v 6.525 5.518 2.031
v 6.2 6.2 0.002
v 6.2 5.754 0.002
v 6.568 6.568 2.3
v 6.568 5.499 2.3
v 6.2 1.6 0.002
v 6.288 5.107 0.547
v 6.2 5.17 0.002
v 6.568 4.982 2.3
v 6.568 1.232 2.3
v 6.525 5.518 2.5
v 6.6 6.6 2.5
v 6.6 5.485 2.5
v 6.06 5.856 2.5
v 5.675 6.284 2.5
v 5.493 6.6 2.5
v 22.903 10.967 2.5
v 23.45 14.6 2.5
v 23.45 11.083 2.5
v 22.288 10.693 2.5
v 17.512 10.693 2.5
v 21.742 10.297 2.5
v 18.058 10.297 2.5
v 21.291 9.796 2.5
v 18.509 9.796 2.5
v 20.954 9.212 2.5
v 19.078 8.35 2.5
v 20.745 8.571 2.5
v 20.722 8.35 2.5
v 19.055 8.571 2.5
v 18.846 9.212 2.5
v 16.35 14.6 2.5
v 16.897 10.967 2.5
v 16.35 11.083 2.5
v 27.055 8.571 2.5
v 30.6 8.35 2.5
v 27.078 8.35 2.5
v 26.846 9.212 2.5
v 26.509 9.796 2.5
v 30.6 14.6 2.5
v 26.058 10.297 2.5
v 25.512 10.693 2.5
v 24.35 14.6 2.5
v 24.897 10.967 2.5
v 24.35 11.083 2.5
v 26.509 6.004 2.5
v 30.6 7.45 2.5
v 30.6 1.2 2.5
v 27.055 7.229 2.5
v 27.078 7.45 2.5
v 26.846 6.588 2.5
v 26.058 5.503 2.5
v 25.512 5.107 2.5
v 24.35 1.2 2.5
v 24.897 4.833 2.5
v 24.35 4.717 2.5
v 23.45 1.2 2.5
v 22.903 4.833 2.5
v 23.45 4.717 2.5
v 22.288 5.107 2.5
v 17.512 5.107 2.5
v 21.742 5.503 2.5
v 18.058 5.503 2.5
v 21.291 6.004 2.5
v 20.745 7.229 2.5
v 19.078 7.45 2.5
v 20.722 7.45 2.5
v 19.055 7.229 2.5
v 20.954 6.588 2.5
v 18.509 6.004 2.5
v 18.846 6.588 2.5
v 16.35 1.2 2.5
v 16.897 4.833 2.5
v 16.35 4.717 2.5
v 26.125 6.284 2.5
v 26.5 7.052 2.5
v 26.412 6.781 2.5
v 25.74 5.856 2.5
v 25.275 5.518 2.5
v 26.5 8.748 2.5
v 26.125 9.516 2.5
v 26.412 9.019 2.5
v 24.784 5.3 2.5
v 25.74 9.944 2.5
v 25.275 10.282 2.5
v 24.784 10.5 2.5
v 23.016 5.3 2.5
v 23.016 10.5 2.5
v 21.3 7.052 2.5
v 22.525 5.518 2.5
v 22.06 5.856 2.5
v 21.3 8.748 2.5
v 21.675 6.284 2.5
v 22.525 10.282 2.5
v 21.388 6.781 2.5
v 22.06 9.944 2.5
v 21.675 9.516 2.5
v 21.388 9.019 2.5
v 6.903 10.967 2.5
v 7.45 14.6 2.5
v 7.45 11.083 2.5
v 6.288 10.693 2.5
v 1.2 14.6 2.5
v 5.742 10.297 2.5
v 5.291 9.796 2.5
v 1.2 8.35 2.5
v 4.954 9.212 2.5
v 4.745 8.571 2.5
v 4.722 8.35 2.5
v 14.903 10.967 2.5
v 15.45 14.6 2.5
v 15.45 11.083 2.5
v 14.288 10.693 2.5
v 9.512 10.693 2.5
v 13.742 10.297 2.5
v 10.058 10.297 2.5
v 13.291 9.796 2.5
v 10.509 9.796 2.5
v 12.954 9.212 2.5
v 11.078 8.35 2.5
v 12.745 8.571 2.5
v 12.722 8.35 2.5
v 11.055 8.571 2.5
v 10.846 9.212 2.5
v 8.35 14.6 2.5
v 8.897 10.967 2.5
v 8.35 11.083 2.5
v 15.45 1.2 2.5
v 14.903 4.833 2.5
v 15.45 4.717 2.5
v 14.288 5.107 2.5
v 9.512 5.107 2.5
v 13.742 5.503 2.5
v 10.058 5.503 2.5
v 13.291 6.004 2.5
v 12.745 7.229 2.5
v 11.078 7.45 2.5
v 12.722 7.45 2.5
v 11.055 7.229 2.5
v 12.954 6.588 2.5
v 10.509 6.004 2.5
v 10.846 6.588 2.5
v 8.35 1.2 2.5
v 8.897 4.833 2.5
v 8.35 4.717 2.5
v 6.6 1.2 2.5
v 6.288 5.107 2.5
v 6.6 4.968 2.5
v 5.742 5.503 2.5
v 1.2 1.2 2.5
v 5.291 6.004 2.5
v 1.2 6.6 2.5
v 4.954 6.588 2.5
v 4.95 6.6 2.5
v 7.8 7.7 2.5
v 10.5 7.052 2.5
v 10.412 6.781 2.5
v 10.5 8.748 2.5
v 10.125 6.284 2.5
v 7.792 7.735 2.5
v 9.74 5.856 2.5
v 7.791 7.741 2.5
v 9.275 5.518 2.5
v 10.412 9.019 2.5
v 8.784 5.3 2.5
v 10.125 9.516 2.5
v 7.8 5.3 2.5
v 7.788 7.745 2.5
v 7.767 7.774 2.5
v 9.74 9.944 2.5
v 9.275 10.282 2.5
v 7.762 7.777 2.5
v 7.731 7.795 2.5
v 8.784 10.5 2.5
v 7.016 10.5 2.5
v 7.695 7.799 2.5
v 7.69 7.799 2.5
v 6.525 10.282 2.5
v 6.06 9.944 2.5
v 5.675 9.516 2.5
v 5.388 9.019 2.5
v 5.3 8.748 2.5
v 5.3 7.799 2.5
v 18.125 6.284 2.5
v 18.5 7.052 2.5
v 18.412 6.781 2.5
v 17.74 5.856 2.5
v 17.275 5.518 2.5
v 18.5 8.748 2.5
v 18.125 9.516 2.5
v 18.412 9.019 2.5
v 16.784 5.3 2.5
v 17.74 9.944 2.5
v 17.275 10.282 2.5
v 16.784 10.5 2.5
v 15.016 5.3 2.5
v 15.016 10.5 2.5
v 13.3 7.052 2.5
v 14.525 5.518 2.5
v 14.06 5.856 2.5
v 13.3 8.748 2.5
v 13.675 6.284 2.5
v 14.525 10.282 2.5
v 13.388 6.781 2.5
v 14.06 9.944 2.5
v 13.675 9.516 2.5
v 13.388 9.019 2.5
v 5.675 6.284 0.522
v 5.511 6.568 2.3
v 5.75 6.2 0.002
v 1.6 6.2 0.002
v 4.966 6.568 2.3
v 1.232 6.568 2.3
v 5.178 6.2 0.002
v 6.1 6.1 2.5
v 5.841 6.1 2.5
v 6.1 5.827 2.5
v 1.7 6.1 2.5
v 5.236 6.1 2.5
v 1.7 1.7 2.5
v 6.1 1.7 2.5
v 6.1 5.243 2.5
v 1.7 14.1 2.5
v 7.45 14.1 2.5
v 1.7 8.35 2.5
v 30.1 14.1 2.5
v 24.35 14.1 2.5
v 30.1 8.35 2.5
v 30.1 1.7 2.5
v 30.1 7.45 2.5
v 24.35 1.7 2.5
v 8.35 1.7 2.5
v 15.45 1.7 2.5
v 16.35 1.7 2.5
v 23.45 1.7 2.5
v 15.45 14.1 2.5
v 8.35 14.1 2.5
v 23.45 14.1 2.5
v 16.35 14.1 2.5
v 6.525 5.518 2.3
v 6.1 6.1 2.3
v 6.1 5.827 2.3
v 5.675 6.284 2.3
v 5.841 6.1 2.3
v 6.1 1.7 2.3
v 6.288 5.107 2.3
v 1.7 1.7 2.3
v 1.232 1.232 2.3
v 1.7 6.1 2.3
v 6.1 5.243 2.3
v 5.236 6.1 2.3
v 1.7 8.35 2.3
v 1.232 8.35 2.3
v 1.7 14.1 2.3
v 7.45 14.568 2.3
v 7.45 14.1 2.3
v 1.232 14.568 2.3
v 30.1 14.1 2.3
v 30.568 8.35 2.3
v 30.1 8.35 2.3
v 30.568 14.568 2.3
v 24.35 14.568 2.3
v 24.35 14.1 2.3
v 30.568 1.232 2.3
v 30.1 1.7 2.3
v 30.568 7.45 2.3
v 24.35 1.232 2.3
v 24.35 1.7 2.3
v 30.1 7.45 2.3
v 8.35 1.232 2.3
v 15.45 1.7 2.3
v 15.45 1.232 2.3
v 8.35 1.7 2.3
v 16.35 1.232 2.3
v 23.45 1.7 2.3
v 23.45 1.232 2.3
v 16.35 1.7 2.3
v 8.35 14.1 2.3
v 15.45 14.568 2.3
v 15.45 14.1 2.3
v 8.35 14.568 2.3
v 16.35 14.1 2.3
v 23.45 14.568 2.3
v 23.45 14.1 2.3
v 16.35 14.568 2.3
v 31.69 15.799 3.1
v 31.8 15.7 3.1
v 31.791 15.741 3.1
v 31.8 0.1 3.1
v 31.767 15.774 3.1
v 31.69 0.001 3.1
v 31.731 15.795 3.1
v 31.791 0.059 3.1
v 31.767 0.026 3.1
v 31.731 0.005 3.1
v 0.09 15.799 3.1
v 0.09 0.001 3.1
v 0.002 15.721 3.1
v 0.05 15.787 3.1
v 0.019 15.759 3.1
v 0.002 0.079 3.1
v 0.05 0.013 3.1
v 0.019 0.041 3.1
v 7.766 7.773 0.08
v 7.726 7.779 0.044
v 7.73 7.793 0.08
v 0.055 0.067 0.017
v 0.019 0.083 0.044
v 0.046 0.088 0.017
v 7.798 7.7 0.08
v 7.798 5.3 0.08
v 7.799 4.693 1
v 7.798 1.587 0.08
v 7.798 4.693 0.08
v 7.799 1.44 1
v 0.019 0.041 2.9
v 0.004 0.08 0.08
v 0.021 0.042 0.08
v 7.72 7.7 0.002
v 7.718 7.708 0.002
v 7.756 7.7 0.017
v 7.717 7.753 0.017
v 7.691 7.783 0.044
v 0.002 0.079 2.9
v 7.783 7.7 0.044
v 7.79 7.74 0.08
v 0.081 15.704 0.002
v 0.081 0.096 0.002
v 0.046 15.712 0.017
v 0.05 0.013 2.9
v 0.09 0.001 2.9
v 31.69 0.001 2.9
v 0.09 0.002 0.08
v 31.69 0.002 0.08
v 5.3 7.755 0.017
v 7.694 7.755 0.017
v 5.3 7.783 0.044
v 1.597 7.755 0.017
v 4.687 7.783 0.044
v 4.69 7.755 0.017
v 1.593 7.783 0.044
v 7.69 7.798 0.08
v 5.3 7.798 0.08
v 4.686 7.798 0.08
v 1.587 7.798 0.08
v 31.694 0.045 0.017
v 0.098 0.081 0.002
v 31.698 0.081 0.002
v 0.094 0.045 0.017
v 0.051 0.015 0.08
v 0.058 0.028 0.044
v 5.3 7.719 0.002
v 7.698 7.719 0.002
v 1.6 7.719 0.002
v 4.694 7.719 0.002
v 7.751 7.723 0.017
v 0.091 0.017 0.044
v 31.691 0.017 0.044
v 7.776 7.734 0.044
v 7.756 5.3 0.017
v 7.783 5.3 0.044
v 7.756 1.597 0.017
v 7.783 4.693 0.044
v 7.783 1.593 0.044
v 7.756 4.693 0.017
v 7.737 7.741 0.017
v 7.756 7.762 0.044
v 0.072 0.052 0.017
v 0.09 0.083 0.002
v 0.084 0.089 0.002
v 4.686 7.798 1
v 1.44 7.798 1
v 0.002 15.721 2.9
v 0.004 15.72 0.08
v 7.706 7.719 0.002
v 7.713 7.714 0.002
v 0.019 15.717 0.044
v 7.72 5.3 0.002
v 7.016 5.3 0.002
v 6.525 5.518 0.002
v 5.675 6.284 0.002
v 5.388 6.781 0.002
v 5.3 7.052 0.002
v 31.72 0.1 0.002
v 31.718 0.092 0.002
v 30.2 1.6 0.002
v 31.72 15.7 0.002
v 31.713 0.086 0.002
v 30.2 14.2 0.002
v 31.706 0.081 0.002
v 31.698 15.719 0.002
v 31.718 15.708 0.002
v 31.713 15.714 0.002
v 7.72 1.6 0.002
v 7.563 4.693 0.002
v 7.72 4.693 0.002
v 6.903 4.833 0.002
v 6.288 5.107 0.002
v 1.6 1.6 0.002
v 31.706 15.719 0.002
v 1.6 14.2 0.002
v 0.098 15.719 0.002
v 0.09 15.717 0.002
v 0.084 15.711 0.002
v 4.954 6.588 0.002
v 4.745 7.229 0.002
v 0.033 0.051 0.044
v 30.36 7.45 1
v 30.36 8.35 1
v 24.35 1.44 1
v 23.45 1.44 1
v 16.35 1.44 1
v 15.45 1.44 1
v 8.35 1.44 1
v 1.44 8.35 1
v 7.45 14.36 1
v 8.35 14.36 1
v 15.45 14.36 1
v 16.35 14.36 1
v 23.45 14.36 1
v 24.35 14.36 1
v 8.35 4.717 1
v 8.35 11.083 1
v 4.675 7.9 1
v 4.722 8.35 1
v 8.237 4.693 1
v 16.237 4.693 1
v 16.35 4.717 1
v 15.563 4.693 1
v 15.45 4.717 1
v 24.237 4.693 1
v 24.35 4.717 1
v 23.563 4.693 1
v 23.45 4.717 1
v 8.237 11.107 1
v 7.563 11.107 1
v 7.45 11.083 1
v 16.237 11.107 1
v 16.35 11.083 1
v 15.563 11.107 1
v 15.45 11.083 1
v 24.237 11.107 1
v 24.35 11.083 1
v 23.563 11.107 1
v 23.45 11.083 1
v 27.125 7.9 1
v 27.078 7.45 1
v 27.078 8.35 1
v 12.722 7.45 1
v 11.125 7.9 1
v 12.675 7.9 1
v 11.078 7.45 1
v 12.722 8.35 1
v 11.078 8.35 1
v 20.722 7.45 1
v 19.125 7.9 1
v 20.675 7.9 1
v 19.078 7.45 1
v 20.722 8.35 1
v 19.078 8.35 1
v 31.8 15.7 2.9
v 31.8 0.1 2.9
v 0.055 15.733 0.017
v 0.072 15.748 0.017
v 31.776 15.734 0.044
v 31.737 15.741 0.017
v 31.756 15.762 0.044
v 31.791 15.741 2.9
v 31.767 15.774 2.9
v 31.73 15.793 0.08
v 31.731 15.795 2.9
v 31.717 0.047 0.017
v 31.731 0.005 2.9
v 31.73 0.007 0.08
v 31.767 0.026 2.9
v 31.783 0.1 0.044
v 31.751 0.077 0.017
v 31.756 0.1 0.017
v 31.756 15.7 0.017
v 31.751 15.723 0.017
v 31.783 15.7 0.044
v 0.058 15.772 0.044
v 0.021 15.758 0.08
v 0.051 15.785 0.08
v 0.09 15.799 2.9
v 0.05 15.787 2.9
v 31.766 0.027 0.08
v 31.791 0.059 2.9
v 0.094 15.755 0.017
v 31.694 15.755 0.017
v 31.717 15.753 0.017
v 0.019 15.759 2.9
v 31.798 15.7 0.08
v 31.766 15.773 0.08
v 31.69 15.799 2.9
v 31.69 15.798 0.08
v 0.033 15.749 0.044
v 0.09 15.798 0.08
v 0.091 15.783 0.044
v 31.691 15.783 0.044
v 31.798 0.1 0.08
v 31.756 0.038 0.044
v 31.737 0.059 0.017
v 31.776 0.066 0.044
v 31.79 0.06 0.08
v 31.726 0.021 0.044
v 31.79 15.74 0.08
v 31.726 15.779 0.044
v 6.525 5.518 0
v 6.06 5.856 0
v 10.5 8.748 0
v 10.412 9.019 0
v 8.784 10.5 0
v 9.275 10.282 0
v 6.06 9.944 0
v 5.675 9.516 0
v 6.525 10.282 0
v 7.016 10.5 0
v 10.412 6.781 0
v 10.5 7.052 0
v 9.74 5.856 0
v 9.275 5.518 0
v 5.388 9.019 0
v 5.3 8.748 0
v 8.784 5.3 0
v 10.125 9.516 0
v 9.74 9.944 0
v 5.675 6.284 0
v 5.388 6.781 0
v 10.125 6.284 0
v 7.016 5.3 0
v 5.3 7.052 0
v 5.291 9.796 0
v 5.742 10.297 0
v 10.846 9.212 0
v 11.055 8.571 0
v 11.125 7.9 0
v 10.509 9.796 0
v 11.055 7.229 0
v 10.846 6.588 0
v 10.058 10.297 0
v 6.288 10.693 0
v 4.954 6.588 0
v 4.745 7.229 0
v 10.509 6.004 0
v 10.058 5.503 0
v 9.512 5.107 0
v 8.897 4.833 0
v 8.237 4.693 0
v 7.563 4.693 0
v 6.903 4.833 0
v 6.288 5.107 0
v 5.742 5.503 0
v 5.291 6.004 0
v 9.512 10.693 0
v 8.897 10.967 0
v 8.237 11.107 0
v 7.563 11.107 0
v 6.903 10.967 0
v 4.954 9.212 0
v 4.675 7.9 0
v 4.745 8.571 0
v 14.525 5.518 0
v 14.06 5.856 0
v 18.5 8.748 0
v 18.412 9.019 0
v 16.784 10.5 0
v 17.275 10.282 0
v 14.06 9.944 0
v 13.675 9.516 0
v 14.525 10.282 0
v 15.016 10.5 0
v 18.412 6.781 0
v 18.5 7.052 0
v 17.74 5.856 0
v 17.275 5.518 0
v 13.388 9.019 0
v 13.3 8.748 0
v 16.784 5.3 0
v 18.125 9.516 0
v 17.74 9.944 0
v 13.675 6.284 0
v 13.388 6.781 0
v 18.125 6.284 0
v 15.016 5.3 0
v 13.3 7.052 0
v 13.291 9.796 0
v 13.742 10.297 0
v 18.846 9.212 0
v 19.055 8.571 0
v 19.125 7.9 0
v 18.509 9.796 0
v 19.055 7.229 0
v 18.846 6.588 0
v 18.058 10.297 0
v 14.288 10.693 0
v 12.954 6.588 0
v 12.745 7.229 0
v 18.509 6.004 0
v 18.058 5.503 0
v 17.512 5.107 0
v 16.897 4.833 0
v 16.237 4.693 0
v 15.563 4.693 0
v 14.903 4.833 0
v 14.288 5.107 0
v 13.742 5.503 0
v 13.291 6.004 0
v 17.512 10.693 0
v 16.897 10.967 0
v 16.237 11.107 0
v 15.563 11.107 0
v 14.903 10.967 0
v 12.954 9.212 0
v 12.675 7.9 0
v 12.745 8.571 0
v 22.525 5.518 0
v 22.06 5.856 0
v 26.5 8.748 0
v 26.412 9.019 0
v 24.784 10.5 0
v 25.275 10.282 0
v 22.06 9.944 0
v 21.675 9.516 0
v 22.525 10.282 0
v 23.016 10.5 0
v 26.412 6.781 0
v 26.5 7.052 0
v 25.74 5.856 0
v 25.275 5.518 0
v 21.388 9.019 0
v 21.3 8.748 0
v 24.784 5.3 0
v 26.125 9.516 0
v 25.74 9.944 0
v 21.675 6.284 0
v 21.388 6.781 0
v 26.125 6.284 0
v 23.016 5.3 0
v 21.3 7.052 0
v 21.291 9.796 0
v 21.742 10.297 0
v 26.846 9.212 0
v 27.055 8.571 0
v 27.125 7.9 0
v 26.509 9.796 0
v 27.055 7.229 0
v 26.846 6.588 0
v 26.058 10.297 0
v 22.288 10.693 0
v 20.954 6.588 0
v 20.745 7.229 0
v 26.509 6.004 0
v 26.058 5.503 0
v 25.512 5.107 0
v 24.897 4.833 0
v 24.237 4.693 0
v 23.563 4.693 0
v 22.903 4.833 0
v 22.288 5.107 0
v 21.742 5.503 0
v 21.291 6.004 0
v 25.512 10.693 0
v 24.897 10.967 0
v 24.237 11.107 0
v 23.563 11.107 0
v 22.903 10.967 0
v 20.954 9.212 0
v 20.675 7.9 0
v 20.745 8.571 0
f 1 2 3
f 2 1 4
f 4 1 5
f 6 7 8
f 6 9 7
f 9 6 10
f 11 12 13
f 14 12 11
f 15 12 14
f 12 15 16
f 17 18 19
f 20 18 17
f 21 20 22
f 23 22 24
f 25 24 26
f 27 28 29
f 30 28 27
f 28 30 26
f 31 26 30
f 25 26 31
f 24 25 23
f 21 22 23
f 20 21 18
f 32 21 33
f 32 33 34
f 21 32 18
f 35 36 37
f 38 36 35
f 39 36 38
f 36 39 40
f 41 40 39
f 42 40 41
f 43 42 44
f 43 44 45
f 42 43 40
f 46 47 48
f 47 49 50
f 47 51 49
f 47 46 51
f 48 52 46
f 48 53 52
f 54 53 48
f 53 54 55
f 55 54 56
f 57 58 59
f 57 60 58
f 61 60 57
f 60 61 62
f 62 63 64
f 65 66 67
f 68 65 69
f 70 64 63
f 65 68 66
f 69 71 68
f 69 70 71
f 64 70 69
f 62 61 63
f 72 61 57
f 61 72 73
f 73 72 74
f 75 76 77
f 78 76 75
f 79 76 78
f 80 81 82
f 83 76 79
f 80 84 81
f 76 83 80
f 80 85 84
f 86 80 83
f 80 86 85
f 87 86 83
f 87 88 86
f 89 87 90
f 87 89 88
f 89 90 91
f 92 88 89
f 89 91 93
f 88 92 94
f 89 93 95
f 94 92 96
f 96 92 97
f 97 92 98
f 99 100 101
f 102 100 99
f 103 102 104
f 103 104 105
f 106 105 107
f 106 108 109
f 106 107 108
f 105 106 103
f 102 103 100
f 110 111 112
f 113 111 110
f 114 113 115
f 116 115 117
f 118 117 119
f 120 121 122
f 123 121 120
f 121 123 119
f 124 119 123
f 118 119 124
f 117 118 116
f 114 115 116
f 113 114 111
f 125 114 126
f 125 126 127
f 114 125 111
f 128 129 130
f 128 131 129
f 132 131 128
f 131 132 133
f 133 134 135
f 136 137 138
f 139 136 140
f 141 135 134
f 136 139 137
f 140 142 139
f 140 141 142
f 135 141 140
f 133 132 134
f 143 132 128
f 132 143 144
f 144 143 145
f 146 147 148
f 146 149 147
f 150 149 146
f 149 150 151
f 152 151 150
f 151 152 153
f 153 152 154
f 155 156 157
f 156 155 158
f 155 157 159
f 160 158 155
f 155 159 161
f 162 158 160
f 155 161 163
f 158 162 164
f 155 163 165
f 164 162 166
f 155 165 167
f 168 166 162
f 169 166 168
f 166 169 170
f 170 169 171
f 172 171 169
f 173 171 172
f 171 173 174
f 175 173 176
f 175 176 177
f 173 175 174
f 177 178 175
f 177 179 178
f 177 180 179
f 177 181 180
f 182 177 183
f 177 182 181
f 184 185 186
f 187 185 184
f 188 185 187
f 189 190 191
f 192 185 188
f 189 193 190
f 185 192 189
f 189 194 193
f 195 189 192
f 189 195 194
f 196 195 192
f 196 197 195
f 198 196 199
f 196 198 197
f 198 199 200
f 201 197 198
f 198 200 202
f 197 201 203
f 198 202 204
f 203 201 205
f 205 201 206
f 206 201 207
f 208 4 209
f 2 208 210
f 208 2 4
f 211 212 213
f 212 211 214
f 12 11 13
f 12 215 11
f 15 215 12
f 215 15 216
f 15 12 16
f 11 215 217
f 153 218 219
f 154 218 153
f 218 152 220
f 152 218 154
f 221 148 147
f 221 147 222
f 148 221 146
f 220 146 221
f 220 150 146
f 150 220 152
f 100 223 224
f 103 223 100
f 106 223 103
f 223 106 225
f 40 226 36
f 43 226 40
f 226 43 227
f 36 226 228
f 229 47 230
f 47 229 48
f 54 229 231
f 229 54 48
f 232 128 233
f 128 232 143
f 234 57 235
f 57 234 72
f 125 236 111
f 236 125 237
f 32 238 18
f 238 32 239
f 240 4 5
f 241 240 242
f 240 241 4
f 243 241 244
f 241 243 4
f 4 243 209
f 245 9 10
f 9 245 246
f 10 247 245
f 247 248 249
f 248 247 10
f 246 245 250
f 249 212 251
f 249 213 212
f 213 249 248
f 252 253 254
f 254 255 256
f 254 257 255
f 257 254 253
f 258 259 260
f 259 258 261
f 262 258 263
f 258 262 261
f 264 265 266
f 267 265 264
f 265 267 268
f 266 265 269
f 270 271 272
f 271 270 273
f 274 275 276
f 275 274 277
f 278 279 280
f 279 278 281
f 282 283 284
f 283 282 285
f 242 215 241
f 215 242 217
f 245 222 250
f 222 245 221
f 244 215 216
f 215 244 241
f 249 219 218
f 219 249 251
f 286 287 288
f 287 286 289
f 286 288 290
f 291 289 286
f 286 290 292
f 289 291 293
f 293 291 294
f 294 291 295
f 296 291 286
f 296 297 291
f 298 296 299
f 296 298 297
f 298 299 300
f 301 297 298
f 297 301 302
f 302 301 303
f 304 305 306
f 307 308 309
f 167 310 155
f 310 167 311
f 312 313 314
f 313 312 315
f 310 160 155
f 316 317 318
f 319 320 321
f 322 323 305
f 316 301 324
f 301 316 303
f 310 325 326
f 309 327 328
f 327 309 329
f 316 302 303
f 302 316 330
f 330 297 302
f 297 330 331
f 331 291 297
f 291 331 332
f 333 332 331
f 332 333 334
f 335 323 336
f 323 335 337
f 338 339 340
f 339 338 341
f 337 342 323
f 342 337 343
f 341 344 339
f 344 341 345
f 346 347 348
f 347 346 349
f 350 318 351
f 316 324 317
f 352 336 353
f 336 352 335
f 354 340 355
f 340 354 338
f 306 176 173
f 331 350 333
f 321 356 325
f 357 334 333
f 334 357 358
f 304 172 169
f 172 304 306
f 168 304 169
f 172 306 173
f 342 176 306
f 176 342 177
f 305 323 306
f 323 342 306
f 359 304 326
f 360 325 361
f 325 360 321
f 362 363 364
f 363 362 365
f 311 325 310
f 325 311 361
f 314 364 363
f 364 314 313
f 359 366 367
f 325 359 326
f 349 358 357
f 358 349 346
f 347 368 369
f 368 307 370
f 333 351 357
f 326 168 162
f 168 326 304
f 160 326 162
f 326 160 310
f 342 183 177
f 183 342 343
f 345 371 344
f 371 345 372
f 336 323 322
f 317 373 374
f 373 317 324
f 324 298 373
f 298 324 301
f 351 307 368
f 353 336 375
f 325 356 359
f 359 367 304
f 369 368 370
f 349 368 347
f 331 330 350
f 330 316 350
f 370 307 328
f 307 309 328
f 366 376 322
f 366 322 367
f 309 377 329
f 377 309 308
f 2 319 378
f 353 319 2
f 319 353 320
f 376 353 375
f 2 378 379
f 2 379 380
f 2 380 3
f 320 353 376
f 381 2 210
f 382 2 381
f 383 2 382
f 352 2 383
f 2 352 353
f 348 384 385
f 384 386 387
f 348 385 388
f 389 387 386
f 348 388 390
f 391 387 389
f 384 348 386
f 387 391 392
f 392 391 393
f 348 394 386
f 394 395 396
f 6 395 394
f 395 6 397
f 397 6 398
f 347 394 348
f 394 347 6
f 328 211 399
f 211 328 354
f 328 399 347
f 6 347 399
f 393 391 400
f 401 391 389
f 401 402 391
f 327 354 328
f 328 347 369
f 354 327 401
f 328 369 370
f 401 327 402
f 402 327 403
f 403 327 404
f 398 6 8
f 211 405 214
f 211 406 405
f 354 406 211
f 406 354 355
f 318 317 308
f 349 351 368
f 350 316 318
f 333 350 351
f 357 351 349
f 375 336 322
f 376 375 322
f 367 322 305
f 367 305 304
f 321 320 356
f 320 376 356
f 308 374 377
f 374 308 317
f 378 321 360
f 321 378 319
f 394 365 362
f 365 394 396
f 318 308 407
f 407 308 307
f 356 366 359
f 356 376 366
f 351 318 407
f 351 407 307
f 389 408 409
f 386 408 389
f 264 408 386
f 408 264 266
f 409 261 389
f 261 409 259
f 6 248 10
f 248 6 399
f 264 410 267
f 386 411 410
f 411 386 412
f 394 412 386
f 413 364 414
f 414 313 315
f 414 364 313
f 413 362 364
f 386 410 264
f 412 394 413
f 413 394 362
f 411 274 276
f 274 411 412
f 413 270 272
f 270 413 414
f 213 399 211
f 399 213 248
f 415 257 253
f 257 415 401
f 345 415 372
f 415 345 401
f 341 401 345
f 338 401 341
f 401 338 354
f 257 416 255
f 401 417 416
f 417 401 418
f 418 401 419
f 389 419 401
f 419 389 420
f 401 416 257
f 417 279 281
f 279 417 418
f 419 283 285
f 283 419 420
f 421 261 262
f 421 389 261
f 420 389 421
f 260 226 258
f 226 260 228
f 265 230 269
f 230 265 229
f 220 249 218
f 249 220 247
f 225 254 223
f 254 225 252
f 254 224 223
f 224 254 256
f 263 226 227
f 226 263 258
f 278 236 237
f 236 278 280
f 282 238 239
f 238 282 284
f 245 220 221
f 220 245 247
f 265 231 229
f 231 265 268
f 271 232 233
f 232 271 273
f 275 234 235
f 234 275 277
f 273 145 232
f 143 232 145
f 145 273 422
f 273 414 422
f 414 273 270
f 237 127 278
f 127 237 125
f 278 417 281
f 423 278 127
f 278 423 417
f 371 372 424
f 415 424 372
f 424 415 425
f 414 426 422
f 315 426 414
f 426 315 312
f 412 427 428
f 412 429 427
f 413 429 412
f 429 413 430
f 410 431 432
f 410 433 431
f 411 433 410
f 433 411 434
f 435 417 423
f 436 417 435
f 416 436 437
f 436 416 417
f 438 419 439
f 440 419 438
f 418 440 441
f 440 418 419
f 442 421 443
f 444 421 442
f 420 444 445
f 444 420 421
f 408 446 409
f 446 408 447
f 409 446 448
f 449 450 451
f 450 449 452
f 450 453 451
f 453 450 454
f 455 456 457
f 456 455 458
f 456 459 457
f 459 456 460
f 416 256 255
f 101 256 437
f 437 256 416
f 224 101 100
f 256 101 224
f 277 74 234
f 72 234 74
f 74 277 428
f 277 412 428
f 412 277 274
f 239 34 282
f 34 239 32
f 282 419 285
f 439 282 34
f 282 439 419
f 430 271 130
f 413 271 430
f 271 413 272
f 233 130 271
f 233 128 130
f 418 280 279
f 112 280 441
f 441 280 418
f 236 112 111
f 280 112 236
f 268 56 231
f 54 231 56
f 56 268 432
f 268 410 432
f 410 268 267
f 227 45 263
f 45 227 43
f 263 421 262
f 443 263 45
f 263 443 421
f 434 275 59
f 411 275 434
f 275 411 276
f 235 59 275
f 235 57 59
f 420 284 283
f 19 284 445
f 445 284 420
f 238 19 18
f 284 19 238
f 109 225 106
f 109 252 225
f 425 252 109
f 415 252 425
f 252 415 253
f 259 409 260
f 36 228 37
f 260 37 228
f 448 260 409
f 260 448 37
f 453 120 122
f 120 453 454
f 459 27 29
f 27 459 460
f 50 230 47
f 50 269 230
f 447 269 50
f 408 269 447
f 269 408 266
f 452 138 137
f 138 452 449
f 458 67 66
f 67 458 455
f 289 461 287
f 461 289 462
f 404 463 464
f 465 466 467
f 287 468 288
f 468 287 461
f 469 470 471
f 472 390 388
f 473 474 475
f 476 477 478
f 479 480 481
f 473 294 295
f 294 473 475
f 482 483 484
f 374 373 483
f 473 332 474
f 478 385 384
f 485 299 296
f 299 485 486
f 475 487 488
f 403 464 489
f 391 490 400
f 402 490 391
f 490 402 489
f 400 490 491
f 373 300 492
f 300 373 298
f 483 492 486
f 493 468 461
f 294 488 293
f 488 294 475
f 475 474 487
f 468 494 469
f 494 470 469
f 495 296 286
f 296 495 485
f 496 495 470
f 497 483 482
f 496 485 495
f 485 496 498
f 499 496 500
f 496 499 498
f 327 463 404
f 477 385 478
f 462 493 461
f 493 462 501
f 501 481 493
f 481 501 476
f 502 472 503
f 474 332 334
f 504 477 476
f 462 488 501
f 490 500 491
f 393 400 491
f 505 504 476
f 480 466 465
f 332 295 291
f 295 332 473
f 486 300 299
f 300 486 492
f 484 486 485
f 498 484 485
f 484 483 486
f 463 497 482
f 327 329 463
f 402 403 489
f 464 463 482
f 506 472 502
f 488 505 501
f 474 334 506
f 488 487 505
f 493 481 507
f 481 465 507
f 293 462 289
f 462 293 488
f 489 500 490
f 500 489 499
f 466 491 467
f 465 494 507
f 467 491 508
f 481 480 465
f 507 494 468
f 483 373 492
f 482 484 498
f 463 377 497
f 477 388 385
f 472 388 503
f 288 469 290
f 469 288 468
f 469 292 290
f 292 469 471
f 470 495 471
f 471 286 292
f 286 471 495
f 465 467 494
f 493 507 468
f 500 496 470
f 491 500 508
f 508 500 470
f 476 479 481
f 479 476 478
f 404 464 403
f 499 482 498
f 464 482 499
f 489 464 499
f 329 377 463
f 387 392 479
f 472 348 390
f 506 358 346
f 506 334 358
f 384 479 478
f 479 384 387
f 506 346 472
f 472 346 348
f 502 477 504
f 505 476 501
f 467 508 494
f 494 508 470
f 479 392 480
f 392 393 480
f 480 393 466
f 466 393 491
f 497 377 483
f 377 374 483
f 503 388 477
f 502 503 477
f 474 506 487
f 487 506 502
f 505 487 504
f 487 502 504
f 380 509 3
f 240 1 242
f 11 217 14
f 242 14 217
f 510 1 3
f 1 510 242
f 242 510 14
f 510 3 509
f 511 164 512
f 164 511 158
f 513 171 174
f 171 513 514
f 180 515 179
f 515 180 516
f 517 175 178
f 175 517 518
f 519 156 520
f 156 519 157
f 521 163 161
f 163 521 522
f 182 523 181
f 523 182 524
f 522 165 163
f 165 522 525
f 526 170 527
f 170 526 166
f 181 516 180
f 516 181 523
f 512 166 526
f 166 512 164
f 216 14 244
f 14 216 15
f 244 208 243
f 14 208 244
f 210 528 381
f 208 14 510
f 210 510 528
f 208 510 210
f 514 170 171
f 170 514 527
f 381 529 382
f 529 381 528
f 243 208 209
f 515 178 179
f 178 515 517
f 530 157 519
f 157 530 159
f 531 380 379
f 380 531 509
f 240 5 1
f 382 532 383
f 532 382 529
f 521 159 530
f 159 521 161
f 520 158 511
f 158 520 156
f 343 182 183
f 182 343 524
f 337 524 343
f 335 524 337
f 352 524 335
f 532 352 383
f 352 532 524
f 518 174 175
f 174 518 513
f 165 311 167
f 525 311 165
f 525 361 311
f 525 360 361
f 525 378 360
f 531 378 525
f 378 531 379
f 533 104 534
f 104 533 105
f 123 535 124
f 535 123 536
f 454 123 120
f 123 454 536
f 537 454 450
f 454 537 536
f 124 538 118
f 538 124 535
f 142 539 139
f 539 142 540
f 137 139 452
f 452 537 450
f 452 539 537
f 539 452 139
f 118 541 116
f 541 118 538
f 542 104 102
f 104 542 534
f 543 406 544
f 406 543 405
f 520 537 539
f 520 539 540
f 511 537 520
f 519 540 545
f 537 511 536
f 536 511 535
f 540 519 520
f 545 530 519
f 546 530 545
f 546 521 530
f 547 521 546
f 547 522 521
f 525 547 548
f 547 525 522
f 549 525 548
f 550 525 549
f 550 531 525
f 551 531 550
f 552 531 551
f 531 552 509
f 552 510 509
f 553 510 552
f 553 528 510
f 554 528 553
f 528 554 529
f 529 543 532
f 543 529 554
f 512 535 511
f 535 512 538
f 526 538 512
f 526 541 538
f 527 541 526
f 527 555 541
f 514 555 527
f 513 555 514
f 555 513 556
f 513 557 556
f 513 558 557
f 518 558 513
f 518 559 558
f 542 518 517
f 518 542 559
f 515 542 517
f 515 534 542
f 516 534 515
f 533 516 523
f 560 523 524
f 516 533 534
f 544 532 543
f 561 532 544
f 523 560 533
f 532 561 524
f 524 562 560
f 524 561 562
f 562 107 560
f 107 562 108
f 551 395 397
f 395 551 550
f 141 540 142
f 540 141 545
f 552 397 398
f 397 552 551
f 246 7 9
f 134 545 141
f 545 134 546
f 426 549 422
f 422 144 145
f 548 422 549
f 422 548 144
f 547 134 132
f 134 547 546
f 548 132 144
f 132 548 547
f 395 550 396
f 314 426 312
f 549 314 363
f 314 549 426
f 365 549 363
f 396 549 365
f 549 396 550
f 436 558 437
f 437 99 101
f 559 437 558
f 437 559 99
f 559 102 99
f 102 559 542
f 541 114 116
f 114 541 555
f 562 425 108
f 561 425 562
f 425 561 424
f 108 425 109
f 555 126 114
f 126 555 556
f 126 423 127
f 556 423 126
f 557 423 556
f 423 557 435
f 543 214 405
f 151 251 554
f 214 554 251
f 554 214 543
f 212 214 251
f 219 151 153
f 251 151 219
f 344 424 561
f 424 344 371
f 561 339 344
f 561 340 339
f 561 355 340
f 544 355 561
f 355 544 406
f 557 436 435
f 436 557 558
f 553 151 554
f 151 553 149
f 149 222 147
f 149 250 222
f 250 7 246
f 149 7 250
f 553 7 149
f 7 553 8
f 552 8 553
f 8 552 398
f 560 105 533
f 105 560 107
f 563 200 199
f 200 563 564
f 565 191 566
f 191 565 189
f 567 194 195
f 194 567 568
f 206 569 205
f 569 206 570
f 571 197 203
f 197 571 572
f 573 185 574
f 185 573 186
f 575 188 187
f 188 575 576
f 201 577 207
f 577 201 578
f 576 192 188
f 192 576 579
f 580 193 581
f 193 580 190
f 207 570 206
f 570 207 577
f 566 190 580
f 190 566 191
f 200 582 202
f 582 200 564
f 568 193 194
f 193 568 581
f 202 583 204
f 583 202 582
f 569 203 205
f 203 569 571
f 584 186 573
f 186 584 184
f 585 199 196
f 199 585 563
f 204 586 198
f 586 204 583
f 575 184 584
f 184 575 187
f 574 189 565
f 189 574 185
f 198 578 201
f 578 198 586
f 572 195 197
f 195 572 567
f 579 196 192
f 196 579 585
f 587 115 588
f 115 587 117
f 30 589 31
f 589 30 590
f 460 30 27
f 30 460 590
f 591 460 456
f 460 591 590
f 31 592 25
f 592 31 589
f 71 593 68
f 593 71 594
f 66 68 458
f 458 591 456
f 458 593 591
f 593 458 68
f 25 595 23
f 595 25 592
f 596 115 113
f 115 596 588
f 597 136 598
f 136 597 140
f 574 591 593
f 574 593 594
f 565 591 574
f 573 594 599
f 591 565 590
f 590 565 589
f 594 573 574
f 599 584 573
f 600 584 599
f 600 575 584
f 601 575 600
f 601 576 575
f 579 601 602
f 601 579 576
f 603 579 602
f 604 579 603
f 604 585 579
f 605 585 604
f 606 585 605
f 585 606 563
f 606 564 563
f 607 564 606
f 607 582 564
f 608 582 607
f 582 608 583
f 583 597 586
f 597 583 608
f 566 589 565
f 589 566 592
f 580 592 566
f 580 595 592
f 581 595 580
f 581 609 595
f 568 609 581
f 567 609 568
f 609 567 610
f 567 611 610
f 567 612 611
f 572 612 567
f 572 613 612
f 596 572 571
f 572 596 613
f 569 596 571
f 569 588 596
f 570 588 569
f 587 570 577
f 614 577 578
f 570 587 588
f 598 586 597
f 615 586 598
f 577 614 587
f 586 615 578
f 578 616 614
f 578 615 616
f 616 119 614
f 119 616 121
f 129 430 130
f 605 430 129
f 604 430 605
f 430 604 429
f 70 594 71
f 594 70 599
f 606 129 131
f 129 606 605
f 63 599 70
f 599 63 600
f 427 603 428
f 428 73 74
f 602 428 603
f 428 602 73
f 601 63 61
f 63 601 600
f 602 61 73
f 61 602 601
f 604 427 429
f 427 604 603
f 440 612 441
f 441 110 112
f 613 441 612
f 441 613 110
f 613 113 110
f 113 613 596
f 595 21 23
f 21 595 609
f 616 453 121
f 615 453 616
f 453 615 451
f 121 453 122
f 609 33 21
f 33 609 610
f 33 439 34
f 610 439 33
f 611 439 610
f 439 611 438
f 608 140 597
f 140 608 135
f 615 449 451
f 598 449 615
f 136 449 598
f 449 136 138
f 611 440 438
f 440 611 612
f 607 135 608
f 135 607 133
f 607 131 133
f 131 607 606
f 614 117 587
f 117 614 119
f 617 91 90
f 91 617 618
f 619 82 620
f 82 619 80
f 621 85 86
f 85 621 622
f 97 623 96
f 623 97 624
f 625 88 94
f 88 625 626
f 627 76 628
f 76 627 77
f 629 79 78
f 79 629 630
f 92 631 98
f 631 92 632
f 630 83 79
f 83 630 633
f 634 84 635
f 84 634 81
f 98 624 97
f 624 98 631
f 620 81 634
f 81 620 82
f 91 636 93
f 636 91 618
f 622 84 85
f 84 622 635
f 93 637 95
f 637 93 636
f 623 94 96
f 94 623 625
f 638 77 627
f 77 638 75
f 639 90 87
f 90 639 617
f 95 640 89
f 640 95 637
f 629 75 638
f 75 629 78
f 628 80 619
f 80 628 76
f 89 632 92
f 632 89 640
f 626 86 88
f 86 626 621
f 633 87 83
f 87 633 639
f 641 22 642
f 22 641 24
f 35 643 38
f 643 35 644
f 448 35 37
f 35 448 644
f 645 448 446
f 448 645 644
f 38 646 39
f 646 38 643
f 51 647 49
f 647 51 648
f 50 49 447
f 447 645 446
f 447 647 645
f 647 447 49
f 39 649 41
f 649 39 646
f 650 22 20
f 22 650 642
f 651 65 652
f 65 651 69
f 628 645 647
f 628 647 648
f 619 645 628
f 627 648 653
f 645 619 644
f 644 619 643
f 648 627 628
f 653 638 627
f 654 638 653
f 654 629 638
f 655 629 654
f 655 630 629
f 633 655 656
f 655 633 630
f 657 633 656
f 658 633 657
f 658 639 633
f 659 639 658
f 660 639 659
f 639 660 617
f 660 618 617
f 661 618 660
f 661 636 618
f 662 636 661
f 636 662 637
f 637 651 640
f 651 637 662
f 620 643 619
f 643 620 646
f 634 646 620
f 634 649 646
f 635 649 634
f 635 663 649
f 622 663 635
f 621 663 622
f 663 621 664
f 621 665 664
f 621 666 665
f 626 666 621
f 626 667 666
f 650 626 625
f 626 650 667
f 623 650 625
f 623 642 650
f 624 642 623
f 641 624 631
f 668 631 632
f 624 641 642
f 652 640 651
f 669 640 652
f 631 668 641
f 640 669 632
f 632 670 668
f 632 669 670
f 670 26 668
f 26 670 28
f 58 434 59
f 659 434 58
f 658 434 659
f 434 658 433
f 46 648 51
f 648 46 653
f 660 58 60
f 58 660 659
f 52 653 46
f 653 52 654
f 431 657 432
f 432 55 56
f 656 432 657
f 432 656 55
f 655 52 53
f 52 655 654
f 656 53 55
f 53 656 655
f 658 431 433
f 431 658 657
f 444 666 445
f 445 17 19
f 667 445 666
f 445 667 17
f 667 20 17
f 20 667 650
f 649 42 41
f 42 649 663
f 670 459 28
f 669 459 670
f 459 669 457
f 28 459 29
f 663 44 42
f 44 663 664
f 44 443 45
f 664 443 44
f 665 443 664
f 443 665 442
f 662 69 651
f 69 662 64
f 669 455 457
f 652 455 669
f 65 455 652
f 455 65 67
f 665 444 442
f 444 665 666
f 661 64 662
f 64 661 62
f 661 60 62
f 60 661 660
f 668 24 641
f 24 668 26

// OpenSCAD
// file: ../lib/brick-hollow.scad
/**
* Machine Blocks
* https://machinemania.net/blocks 
*
* Brick Hollow
* Copyright (c) 2022 Jan Philipp Knoeller <pk@pksoftware.de>
*
* Published under license:
* Creative Commons Attribution-NonCommercial-ShareAlike 4.0 International 
* https://creativecommons.org/licenses/by-nc-sa/4.0/
*
*/
echo(version=version());

module brickHollow(height=9.3, fade=2.5, minSize=[4.6,4.6], maxSize=[5.2, 5.2], center = false){
    echo(height, minSize, maxSize, fade);
    sizeX = max(minSize[0],maxSize[0]); 
   sizeY = max(minSize[1],maxSize[1]); 
    
    posX = center ? 0 : 0.5*sizeX; 
   posY = center ? 0 : 0.5*sizeY;   
   posZ = center ? -0.5 * (height-fade) : 0.5*fade;
    
    cutHelper = 0.2;
    overlapSpace=0.1;
    
    translate([posX, posY, posZ]){
        union(){
            polyhedron(points=[
                [-0.5*minSize[0],-0.5*minSize[1],-0.5*fade],
                [0.5*minSize[0],-0.5*minSize[1],-0.5*fade],
                [0.5*minSize[0],0.5*minSize[1],-0.5*fade],
                [-0.5*minSize[0],0.5*minSize[1],-0.5*fade],
                [-0.5*maxSize[0],-0.5*maxSize[1],0.5*fade],
                [0.5*maxSize[0],-0.5*maxSize[1],0.5*fade],
                [0.5*maxSize[0],0.5*maxSize[1],0.5*fade],
                [-0.5*maxSize[0],0.5*maxSize[1],0.5*fade]
            ], faces=[[0,1,2,3],[1,0,4,5],[2,1,5,6],[3,2,6,7],[0,3,7,4],[7,6,5,4]]);
            
            if(height > fade){
                translate([0,0,0.5*height - overlapSpace]){
                    cube([maxSize[0], maxSize[1], height - fade + overlapSpace], center=true);
                }
            }
            
            translate([0,0,-0.5*(fade + cutHelper) + overlapSpace]){
                cube([minSize[0], minSize[1], cutHelper + overlapSpace], center=true);
            }
        }
    }
}

//brickHollow(height=9.3, maxSize=[5.2,5.2], minSize=[4.6,4.6], center=true);
// file: ../lib/roundedcube_simple.scad
/**
* Machine Blocks
* https://machinemania.net/blocks 
*
* Module for simple rounded cubes
* Copyright (c) 2022 Jan Philipp Knoeller <pk@pksoftware.de>
*
* Published under license:
* Creative Commons Attribution-NonCommercial-ShareAlike 4.0 International 
* https://creativecommons.org/licenses/by-nc-sa/4.0/
*
*/
module roundedcube_simple(size = [1, 1, 1], center = false, radius = 0.5, resolution = 20) {
	// If single value, convert to [x, y, z] vector
	size = (size[0] == undef) ? [size, size, size] : size;

	translate = (center == false) ?
		[radius, radius, radius] :
		[
			radius - (size[0] / 2),
			radius - (size[1] / 2),
			radius - (size[2] / 2)
	];

	translate(v = translate)
	minkowski() {
		cube(size = [
			size[0] - (radius * 2),
			size[1] - (radius * 2),
			size[2] - (radius * 2)
		]);
		sphere(r = radius, $fn = resolution);
	}
}
// file: ../lib/roundedcube.scad
// More information: https://danielupshaw.com/openscad-rounded-corners/

// Set to 0.01 for higher definition curves (renders slower)
$fs = 0.15;

module roundedcube(size = [1, 1, 1], center = false, radius = 0.5, apply_to = "all", resolution = 20) {
	// If single value, convert to [x, y, z] vector
	size = (size[0] == undef) ? [size, size, size] : size;

	translate_min = radius;
	translate_xmax = size[0] - radius;
	translate_ymax = size[1] - radius;
	translate_zmax = size[2] - radius;

	diameter = radius * 2;

	obj_translate = (center == false) ?
		[0, 0, 0] : [
			-(size[0] / 2),
			-(size[1] / 2),
			-(size[2] / 2)
		];

	translate(v = obj_translate) {
		hull() {
			for (translate_x = [translate_min, translate_xmax]) {
				x_at = (translate_x == translate_min) ? "min" : "max";
				for (translate_y = [translate_min, translate_ymax]) {
					y_at = (translate_y == translate_min) ? "min" : "max";
					for (translate_z = [translate_min, translate_zmax]) {
						z_at = (translate_z == translate_min) ? "min" : "max";

						translate(v = [translate_x, translate_y, translate_z])
						if (
							(apply_to == "all") ||
							(apply_to == "xmin" && x_at == "min") || (apply_to == "xmax" && x_at == "max") ||
							(apply_to == "ymin" && y_at == "min") || (apply_to == "ymax" && y_at == "max") ||
							(apply_to == "zmin" && z_at == "min") || (apply_to == "zmax" && z_at == "max")
						) {
							sphere(r = radius, $fn = resolution);
						} else {
							rotate = 
								(apply_to == "xmin" || apply_to == "xmax" || apply_to == "x") ? [0, 90, 0] : (
								(apply_to == "ymin" || apply_to == "ymax" || apply_to == "y") ? [90, 90, 0] :
								[0, 0, 0]
							);
							rotate(a = rotate)
							cylinder(h = diameter, r = radius, center = true, $fn = resolution);
						}
					}
				}
			}
		}
	}
}
// main file
/**
* Machine Blocks
* https://machinemania.net/blocks 
*
* Plate 4x2 without knobs
* Copyright (c) 2022 Jan Philipp Knoeller <pk@pksoftware.de>
*
* Published under license:
* Creative Commons Attribution-NonCommercial-ShareAlike 4.0 International 
* https://creativecommons.org/licenses/by-nc-sa/4.0/
*
*/
echo(version=version());

include <../lib/block-v2.scad>;

block(grid=[1,1], withKnobs=false);
echo(version=version());

include <../lib/block-v2.scad>;

block(grid=[4,2], withKnobs=false);
